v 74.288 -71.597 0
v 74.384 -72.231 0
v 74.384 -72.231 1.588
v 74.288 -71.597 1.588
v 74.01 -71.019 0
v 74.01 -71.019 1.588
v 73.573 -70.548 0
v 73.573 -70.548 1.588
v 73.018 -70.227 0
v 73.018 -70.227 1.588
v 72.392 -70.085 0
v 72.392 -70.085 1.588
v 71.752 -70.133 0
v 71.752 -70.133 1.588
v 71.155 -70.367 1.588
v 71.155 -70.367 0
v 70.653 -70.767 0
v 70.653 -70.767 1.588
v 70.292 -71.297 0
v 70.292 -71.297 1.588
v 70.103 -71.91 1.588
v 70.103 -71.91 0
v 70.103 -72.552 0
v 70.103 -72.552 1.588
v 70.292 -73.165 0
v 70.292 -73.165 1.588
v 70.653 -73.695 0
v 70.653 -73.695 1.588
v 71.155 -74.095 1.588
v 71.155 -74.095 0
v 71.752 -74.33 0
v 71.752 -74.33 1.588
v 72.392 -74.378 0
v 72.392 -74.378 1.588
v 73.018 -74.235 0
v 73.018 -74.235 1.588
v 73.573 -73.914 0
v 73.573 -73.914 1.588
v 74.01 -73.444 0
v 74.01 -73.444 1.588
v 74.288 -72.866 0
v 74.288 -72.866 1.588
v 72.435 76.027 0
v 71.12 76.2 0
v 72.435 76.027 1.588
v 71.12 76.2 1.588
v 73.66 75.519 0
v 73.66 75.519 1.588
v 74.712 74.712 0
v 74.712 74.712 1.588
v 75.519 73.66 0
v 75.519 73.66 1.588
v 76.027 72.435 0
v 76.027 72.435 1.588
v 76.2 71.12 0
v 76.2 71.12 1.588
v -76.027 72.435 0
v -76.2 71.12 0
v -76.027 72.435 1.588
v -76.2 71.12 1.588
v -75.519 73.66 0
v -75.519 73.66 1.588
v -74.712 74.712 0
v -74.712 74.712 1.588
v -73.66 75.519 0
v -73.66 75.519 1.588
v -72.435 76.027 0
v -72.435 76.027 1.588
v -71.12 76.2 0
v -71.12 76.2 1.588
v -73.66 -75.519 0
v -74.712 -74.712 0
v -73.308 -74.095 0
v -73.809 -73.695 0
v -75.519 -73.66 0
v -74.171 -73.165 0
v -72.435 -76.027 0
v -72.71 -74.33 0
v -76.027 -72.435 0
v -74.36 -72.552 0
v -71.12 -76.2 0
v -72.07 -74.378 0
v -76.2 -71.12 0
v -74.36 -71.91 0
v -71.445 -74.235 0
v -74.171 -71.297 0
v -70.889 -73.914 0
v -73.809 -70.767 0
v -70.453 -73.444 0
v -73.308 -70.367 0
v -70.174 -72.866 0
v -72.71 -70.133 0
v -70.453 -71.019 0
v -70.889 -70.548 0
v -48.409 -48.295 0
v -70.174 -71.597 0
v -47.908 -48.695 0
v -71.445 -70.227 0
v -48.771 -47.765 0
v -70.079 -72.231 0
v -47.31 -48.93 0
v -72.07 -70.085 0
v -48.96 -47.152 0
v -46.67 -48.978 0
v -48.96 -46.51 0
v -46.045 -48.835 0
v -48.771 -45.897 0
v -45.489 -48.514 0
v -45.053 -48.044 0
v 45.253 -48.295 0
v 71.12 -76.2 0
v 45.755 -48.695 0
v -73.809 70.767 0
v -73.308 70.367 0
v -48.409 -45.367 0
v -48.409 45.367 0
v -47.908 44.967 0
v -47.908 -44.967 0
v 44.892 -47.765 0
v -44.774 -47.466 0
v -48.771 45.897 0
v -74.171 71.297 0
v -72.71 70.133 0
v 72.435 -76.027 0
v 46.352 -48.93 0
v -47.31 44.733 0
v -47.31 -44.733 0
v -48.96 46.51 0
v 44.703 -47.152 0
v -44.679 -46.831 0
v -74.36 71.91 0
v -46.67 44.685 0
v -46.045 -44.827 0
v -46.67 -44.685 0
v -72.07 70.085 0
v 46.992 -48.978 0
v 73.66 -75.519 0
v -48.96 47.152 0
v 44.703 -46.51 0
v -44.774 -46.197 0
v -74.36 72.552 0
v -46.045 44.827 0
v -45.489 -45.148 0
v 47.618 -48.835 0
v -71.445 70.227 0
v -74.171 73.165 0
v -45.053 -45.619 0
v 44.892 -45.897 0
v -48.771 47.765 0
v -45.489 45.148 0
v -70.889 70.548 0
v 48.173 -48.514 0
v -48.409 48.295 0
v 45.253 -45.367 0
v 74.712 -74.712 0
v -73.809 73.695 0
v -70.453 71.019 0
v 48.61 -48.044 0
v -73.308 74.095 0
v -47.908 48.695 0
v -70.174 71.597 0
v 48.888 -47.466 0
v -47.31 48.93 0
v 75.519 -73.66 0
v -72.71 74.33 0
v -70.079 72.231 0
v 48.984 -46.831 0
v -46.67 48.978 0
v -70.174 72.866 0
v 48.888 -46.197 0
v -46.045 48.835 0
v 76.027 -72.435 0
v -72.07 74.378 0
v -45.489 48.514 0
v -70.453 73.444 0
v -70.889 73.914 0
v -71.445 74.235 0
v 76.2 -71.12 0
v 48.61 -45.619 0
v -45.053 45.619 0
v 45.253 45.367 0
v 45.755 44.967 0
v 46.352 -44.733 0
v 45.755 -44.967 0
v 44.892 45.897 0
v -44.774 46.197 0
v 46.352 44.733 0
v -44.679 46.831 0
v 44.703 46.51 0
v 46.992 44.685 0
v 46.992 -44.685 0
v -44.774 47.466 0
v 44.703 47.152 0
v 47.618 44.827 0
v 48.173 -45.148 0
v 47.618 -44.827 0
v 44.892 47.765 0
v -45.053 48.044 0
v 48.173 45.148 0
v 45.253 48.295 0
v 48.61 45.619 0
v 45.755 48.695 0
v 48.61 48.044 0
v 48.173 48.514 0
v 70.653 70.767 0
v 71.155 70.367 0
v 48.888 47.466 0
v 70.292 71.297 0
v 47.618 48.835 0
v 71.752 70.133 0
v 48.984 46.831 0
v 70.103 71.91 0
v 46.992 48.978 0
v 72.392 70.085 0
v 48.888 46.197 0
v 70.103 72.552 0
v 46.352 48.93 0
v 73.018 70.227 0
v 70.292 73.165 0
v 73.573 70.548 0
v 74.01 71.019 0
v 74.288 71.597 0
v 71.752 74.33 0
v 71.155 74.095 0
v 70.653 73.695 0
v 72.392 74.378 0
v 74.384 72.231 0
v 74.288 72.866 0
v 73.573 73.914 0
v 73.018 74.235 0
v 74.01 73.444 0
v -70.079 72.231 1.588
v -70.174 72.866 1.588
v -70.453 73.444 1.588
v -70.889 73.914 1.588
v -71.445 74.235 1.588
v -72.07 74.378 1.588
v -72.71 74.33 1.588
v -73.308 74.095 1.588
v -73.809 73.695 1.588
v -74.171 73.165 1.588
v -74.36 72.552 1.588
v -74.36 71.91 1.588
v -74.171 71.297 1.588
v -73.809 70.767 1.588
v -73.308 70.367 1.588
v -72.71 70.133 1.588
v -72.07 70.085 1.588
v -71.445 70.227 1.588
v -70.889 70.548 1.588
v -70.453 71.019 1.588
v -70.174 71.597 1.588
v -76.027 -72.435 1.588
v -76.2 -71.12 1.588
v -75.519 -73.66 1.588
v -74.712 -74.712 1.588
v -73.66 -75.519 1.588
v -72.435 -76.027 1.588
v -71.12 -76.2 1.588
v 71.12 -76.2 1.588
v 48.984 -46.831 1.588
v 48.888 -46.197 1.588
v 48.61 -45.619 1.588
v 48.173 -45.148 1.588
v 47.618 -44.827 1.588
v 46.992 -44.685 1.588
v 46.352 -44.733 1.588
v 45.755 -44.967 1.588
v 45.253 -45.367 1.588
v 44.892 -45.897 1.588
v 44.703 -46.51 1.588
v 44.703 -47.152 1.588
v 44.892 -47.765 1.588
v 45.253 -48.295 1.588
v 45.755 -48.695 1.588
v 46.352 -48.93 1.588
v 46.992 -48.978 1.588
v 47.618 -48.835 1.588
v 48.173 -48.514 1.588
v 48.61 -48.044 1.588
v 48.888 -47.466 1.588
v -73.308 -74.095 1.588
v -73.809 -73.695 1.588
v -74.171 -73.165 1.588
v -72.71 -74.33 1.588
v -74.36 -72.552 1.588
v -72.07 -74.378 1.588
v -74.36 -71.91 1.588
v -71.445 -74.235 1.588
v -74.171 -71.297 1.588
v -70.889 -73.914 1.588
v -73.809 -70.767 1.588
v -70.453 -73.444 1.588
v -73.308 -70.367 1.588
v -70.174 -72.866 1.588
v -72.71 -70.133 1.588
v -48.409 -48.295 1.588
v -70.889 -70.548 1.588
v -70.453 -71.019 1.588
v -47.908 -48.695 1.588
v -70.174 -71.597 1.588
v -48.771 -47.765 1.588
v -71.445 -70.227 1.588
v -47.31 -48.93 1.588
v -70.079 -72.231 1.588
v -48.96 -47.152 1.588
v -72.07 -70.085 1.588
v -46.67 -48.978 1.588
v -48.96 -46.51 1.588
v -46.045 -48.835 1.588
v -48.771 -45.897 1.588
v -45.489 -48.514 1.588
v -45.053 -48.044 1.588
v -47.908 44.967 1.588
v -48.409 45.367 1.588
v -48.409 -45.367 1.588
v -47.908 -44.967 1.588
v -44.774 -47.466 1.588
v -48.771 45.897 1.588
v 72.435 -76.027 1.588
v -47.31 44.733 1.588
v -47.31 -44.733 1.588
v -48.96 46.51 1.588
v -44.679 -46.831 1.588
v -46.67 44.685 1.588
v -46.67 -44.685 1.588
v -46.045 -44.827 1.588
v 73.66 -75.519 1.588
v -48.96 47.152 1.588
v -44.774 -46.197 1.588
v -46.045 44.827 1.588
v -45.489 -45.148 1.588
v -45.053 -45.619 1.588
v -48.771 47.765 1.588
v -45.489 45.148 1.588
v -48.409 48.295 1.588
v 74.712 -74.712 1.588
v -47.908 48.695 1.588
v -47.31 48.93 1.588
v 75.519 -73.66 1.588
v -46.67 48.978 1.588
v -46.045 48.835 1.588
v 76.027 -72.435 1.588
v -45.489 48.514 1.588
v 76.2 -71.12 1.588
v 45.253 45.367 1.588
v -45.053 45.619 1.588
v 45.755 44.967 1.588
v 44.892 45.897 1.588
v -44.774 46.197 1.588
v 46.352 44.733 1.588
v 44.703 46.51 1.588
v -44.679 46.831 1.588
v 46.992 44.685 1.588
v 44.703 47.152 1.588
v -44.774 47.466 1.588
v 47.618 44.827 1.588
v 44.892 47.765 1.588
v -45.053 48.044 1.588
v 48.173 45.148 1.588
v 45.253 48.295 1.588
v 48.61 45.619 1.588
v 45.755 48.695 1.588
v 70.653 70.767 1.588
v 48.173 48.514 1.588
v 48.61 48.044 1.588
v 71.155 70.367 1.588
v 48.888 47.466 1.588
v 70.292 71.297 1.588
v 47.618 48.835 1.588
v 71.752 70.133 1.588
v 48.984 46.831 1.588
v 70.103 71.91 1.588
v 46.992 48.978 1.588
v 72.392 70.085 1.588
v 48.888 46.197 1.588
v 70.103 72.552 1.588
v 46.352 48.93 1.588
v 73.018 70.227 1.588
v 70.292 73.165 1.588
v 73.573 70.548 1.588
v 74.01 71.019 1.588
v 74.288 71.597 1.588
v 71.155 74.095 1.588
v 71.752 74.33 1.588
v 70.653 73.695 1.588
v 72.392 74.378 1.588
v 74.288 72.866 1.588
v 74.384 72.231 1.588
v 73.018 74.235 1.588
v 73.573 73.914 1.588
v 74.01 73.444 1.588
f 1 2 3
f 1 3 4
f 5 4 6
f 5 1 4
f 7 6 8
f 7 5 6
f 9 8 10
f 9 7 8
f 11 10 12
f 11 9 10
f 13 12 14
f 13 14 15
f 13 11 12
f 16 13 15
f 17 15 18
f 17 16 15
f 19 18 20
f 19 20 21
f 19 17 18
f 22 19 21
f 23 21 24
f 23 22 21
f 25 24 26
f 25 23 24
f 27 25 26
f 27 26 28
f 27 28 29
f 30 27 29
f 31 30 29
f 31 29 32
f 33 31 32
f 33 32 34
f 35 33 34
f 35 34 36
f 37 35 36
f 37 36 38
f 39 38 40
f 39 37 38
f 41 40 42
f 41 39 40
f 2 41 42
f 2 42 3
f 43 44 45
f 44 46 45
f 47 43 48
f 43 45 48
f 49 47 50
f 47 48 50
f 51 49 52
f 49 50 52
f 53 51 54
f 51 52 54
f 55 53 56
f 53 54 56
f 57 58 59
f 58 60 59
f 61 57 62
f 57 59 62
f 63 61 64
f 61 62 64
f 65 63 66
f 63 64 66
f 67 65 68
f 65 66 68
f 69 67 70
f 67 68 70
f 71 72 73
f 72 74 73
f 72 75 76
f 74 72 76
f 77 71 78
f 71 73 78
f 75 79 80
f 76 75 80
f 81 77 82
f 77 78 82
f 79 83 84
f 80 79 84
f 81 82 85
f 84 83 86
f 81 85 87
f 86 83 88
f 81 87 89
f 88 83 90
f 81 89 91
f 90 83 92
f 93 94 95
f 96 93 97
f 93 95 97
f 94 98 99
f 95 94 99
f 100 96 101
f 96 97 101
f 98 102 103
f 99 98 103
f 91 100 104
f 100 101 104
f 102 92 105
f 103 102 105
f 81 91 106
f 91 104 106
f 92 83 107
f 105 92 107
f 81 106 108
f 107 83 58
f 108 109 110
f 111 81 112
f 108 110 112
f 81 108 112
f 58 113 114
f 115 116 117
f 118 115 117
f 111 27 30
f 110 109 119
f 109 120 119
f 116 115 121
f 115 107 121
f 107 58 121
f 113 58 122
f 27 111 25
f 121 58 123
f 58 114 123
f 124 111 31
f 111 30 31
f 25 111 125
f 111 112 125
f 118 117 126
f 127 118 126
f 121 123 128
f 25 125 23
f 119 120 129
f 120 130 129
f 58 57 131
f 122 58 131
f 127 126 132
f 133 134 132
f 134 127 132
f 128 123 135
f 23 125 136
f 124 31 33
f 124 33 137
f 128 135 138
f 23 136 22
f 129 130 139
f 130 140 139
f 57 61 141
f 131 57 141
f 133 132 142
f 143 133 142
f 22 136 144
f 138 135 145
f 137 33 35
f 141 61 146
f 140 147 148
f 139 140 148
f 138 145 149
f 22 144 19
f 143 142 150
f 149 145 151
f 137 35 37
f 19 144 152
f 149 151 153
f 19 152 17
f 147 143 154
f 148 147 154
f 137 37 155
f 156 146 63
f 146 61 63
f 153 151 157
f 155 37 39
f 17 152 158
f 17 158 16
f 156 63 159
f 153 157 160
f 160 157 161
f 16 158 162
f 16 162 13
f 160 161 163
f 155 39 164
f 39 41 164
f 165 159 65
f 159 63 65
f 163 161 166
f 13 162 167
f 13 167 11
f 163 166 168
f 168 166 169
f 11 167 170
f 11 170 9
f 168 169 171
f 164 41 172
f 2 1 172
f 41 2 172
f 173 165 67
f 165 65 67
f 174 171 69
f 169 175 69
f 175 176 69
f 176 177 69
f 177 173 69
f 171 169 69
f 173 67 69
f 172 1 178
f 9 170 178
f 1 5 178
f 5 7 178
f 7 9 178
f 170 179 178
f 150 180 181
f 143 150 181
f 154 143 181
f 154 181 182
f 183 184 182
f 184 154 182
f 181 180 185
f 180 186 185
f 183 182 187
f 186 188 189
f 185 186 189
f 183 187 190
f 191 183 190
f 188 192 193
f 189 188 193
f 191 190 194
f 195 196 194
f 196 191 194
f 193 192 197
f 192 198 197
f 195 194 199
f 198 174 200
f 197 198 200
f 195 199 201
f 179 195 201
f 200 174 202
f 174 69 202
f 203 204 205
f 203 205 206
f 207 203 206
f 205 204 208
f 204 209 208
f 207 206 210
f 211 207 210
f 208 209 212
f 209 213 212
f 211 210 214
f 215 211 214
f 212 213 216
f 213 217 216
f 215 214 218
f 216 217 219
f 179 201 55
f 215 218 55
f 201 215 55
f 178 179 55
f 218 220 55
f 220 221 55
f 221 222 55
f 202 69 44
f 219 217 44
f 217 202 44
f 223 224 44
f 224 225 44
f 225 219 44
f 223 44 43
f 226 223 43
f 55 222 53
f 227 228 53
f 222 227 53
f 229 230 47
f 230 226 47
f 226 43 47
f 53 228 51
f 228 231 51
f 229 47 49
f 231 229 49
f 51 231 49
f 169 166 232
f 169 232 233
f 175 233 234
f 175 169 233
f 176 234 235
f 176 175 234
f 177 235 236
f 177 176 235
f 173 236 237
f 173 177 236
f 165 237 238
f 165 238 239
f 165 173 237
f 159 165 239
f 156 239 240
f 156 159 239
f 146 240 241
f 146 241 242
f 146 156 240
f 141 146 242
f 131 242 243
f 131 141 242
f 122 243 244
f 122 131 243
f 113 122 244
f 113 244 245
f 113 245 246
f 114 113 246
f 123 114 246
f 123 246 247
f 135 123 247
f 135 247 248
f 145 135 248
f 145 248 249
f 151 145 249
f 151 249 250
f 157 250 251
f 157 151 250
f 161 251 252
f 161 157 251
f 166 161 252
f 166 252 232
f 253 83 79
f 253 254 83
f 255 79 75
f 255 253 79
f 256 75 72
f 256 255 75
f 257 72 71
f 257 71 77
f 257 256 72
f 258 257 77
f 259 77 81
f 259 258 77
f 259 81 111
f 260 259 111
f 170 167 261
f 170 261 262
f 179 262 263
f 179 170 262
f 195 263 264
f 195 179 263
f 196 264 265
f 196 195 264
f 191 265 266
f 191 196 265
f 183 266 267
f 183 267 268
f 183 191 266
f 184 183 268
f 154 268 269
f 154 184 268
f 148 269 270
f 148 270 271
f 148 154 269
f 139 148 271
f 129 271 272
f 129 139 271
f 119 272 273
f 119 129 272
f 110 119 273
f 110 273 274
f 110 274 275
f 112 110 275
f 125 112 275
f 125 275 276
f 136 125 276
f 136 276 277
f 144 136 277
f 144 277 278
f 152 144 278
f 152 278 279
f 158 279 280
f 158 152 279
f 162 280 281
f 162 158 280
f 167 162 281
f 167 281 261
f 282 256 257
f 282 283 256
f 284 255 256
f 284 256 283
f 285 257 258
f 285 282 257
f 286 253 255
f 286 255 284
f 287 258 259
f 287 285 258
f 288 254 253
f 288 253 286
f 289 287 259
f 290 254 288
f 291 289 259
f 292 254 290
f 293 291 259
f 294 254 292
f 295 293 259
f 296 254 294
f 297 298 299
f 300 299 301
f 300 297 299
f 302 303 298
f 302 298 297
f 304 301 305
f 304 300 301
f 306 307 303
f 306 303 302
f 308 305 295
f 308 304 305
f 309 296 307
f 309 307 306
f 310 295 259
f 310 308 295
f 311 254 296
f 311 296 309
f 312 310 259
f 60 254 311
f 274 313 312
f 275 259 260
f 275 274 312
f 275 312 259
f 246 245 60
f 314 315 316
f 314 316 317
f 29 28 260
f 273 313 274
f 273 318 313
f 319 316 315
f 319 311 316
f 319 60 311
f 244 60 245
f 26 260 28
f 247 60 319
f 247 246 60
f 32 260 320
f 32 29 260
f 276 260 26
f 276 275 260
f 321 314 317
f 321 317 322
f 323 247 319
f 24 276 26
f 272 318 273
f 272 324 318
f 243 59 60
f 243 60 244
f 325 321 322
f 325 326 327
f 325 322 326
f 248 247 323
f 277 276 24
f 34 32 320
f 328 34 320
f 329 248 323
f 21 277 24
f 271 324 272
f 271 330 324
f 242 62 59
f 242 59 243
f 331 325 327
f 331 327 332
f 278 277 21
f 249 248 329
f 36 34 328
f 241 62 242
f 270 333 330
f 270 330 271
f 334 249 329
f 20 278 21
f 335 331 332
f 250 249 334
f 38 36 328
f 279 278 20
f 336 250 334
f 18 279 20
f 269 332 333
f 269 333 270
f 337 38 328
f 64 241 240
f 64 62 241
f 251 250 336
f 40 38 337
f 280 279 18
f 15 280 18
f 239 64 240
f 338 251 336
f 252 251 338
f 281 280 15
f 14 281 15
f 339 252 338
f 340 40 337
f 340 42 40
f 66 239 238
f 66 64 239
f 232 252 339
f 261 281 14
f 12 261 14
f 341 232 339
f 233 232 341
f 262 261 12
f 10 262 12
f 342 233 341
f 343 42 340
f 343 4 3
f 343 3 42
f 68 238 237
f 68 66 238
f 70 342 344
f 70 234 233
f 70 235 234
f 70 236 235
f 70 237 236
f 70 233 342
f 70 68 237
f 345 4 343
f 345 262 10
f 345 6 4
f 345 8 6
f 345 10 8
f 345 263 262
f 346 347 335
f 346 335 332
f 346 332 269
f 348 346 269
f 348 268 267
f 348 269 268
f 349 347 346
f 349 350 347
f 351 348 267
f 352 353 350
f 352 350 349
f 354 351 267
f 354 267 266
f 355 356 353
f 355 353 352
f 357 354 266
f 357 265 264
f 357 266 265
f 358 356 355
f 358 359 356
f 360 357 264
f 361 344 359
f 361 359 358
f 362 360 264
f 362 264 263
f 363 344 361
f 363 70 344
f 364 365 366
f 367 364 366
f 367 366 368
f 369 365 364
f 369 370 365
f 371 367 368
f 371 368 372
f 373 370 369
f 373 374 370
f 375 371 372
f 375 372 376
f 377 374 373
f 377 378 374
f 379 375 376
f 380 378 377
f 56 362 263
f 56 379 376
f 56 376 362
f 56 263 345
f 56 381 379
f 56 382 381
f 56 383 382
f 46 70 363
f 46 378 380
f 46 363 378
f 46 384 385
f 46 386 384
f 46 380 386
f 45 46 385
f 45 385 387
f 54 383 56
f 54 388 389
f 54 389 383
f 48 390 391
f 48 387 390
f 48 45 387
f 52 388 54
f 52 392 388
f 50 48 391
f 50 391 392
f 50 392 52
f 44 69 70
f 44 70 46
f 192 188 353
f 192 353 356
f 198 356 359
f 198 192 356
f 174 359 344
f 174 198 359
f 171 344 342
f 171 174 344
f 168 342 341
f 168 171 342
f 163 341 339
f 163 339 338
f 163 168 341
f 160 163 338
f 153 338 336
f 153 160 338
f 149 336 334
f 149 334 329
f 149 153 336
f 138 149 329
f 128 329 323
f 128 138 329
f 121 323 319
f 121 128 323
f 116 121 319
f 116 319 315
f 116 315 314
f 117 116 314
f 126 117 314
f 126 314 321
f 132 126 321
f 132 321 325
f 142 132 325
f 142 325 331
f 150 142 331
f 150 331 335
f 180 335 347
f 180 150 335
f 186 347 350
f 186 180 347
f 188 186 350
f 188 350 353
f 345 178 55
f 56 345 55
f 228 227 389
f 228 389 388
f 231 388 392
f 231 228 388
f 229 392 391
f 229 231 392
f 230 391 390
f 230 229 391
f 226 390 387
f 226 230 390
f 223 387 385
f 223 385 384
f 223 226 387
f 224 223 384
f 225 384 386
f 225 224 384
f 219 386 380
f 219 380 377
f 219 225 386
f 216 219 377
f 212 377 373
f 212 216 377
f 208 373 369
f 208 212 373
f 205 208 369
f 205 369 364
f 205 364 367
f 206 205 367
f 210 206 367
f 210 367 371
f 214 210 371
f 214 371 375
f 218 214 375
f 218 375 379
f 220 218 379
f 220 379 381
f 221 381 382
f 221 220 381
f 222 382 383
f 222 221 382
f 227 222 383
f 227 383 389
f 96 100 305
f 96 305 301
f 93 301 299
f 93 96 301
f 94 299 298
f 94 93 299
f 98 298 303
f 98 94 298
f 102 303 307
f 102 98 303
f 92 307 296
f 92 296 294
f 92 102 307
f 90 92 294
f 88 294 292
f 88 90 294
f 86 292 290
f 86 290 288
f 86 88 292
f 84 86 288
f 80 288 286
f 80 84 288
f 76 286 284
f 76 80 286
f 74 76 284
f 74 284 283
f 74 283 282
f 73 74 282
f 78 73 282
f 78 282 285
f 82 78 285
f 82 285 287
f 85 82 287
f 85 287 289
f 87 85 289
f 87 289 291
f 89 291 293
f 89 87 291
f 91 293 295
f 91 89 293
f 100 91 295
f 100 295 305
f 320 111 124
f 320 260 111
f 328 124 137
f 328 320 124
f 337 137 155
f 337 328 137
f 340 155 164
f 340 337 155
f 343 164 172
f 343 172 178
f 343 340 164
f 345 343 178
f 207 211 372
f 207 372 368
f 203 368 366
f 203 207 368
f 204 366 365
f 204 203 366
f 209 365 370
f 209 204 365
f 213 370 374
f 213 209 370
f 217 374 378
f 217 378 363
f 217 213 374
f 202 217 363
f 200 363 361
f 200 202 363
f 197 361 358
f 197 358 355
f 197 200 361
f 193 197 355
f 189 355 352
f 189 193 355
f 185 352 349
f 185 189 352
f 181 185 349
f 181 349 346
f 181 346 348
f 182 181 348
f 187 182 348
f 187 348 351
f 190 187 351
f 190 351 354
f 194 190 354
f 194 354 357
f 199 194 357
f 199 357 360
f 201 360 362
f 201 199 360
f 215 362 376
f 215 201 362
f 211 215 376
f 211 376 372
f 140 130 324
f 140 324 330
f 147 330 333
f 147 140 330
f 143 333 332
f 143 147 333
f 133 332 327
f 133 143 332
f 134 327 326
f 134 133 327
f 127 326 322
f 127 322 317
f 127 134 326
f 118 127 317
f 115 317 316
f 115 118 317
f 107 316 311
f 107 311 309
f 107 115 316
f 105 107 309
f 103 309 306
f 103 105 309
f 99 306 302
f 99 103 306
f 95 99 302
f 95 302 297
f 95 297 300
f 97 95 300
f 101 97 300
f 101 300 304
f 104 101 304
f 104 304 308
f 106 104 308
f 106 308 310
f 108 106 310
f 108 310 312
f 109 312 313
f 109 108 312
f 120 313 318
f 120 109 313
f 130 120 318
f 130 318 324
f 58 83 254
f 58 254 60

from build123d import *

# Parameters (mm, degrees)
F0_W     = 152.4
F0_H     = 152.4
F0_R     = 2.15265
F1_DEPTH = 1.5875
F2_R     = 5.08


with BuildPart() as f1:
    # F0 (on Top) → F1 (new body)
    with BuildSketch(Plane.XY):
        Rectangle(F0_W, F0_H)
        with Locations((-72.23125, -72.23125)):
            Circle(F0_R, mode=Mode.SUBTRACT)
        with Locations((-46.83125, -46.83125)):
            Circle(F0_R, mode=Mode.SUBTRACT)
        with Locations((72.23125, -72.23125)):
            Circle(F0_R, mode=Mode.SUBTRACT)
        with Locations((46.83125, -46.83125)):
            Circle(F0_R, mode=Mode.SUBTRACT)
        with Locations((-46.83125, 46.83125)):
            Circle(F0_R, mode=Mode.SUBTRACT)
        with Locations((-72.23125, 72.23125)):
            Circle(F0_R, mode=Mode.SUBTRACT)
        with Locations((46.83125, 46.83125)):
            Circle(F0_R, mode=Mode.SUBTRACT)
        with Locations((72.23125, 72.23125)):
            Circle(F0_R, mode=Mode.SUBTRACT)
    extrude(amount=F1_DEPTH)

    # F2
    f2_edges = [f1.edges().sort_by_distance(p)[0] for p in [
        (-76.2, 76.2, 0.79375),
        (76.2, 76.2, 0.79375),
        (76.2, -76.2, 0.79375),
        (-76.2, -76.2, 0.79375),
    ]]
    fillet(f2_edges, radius=F2_R)


solid = f1.part
